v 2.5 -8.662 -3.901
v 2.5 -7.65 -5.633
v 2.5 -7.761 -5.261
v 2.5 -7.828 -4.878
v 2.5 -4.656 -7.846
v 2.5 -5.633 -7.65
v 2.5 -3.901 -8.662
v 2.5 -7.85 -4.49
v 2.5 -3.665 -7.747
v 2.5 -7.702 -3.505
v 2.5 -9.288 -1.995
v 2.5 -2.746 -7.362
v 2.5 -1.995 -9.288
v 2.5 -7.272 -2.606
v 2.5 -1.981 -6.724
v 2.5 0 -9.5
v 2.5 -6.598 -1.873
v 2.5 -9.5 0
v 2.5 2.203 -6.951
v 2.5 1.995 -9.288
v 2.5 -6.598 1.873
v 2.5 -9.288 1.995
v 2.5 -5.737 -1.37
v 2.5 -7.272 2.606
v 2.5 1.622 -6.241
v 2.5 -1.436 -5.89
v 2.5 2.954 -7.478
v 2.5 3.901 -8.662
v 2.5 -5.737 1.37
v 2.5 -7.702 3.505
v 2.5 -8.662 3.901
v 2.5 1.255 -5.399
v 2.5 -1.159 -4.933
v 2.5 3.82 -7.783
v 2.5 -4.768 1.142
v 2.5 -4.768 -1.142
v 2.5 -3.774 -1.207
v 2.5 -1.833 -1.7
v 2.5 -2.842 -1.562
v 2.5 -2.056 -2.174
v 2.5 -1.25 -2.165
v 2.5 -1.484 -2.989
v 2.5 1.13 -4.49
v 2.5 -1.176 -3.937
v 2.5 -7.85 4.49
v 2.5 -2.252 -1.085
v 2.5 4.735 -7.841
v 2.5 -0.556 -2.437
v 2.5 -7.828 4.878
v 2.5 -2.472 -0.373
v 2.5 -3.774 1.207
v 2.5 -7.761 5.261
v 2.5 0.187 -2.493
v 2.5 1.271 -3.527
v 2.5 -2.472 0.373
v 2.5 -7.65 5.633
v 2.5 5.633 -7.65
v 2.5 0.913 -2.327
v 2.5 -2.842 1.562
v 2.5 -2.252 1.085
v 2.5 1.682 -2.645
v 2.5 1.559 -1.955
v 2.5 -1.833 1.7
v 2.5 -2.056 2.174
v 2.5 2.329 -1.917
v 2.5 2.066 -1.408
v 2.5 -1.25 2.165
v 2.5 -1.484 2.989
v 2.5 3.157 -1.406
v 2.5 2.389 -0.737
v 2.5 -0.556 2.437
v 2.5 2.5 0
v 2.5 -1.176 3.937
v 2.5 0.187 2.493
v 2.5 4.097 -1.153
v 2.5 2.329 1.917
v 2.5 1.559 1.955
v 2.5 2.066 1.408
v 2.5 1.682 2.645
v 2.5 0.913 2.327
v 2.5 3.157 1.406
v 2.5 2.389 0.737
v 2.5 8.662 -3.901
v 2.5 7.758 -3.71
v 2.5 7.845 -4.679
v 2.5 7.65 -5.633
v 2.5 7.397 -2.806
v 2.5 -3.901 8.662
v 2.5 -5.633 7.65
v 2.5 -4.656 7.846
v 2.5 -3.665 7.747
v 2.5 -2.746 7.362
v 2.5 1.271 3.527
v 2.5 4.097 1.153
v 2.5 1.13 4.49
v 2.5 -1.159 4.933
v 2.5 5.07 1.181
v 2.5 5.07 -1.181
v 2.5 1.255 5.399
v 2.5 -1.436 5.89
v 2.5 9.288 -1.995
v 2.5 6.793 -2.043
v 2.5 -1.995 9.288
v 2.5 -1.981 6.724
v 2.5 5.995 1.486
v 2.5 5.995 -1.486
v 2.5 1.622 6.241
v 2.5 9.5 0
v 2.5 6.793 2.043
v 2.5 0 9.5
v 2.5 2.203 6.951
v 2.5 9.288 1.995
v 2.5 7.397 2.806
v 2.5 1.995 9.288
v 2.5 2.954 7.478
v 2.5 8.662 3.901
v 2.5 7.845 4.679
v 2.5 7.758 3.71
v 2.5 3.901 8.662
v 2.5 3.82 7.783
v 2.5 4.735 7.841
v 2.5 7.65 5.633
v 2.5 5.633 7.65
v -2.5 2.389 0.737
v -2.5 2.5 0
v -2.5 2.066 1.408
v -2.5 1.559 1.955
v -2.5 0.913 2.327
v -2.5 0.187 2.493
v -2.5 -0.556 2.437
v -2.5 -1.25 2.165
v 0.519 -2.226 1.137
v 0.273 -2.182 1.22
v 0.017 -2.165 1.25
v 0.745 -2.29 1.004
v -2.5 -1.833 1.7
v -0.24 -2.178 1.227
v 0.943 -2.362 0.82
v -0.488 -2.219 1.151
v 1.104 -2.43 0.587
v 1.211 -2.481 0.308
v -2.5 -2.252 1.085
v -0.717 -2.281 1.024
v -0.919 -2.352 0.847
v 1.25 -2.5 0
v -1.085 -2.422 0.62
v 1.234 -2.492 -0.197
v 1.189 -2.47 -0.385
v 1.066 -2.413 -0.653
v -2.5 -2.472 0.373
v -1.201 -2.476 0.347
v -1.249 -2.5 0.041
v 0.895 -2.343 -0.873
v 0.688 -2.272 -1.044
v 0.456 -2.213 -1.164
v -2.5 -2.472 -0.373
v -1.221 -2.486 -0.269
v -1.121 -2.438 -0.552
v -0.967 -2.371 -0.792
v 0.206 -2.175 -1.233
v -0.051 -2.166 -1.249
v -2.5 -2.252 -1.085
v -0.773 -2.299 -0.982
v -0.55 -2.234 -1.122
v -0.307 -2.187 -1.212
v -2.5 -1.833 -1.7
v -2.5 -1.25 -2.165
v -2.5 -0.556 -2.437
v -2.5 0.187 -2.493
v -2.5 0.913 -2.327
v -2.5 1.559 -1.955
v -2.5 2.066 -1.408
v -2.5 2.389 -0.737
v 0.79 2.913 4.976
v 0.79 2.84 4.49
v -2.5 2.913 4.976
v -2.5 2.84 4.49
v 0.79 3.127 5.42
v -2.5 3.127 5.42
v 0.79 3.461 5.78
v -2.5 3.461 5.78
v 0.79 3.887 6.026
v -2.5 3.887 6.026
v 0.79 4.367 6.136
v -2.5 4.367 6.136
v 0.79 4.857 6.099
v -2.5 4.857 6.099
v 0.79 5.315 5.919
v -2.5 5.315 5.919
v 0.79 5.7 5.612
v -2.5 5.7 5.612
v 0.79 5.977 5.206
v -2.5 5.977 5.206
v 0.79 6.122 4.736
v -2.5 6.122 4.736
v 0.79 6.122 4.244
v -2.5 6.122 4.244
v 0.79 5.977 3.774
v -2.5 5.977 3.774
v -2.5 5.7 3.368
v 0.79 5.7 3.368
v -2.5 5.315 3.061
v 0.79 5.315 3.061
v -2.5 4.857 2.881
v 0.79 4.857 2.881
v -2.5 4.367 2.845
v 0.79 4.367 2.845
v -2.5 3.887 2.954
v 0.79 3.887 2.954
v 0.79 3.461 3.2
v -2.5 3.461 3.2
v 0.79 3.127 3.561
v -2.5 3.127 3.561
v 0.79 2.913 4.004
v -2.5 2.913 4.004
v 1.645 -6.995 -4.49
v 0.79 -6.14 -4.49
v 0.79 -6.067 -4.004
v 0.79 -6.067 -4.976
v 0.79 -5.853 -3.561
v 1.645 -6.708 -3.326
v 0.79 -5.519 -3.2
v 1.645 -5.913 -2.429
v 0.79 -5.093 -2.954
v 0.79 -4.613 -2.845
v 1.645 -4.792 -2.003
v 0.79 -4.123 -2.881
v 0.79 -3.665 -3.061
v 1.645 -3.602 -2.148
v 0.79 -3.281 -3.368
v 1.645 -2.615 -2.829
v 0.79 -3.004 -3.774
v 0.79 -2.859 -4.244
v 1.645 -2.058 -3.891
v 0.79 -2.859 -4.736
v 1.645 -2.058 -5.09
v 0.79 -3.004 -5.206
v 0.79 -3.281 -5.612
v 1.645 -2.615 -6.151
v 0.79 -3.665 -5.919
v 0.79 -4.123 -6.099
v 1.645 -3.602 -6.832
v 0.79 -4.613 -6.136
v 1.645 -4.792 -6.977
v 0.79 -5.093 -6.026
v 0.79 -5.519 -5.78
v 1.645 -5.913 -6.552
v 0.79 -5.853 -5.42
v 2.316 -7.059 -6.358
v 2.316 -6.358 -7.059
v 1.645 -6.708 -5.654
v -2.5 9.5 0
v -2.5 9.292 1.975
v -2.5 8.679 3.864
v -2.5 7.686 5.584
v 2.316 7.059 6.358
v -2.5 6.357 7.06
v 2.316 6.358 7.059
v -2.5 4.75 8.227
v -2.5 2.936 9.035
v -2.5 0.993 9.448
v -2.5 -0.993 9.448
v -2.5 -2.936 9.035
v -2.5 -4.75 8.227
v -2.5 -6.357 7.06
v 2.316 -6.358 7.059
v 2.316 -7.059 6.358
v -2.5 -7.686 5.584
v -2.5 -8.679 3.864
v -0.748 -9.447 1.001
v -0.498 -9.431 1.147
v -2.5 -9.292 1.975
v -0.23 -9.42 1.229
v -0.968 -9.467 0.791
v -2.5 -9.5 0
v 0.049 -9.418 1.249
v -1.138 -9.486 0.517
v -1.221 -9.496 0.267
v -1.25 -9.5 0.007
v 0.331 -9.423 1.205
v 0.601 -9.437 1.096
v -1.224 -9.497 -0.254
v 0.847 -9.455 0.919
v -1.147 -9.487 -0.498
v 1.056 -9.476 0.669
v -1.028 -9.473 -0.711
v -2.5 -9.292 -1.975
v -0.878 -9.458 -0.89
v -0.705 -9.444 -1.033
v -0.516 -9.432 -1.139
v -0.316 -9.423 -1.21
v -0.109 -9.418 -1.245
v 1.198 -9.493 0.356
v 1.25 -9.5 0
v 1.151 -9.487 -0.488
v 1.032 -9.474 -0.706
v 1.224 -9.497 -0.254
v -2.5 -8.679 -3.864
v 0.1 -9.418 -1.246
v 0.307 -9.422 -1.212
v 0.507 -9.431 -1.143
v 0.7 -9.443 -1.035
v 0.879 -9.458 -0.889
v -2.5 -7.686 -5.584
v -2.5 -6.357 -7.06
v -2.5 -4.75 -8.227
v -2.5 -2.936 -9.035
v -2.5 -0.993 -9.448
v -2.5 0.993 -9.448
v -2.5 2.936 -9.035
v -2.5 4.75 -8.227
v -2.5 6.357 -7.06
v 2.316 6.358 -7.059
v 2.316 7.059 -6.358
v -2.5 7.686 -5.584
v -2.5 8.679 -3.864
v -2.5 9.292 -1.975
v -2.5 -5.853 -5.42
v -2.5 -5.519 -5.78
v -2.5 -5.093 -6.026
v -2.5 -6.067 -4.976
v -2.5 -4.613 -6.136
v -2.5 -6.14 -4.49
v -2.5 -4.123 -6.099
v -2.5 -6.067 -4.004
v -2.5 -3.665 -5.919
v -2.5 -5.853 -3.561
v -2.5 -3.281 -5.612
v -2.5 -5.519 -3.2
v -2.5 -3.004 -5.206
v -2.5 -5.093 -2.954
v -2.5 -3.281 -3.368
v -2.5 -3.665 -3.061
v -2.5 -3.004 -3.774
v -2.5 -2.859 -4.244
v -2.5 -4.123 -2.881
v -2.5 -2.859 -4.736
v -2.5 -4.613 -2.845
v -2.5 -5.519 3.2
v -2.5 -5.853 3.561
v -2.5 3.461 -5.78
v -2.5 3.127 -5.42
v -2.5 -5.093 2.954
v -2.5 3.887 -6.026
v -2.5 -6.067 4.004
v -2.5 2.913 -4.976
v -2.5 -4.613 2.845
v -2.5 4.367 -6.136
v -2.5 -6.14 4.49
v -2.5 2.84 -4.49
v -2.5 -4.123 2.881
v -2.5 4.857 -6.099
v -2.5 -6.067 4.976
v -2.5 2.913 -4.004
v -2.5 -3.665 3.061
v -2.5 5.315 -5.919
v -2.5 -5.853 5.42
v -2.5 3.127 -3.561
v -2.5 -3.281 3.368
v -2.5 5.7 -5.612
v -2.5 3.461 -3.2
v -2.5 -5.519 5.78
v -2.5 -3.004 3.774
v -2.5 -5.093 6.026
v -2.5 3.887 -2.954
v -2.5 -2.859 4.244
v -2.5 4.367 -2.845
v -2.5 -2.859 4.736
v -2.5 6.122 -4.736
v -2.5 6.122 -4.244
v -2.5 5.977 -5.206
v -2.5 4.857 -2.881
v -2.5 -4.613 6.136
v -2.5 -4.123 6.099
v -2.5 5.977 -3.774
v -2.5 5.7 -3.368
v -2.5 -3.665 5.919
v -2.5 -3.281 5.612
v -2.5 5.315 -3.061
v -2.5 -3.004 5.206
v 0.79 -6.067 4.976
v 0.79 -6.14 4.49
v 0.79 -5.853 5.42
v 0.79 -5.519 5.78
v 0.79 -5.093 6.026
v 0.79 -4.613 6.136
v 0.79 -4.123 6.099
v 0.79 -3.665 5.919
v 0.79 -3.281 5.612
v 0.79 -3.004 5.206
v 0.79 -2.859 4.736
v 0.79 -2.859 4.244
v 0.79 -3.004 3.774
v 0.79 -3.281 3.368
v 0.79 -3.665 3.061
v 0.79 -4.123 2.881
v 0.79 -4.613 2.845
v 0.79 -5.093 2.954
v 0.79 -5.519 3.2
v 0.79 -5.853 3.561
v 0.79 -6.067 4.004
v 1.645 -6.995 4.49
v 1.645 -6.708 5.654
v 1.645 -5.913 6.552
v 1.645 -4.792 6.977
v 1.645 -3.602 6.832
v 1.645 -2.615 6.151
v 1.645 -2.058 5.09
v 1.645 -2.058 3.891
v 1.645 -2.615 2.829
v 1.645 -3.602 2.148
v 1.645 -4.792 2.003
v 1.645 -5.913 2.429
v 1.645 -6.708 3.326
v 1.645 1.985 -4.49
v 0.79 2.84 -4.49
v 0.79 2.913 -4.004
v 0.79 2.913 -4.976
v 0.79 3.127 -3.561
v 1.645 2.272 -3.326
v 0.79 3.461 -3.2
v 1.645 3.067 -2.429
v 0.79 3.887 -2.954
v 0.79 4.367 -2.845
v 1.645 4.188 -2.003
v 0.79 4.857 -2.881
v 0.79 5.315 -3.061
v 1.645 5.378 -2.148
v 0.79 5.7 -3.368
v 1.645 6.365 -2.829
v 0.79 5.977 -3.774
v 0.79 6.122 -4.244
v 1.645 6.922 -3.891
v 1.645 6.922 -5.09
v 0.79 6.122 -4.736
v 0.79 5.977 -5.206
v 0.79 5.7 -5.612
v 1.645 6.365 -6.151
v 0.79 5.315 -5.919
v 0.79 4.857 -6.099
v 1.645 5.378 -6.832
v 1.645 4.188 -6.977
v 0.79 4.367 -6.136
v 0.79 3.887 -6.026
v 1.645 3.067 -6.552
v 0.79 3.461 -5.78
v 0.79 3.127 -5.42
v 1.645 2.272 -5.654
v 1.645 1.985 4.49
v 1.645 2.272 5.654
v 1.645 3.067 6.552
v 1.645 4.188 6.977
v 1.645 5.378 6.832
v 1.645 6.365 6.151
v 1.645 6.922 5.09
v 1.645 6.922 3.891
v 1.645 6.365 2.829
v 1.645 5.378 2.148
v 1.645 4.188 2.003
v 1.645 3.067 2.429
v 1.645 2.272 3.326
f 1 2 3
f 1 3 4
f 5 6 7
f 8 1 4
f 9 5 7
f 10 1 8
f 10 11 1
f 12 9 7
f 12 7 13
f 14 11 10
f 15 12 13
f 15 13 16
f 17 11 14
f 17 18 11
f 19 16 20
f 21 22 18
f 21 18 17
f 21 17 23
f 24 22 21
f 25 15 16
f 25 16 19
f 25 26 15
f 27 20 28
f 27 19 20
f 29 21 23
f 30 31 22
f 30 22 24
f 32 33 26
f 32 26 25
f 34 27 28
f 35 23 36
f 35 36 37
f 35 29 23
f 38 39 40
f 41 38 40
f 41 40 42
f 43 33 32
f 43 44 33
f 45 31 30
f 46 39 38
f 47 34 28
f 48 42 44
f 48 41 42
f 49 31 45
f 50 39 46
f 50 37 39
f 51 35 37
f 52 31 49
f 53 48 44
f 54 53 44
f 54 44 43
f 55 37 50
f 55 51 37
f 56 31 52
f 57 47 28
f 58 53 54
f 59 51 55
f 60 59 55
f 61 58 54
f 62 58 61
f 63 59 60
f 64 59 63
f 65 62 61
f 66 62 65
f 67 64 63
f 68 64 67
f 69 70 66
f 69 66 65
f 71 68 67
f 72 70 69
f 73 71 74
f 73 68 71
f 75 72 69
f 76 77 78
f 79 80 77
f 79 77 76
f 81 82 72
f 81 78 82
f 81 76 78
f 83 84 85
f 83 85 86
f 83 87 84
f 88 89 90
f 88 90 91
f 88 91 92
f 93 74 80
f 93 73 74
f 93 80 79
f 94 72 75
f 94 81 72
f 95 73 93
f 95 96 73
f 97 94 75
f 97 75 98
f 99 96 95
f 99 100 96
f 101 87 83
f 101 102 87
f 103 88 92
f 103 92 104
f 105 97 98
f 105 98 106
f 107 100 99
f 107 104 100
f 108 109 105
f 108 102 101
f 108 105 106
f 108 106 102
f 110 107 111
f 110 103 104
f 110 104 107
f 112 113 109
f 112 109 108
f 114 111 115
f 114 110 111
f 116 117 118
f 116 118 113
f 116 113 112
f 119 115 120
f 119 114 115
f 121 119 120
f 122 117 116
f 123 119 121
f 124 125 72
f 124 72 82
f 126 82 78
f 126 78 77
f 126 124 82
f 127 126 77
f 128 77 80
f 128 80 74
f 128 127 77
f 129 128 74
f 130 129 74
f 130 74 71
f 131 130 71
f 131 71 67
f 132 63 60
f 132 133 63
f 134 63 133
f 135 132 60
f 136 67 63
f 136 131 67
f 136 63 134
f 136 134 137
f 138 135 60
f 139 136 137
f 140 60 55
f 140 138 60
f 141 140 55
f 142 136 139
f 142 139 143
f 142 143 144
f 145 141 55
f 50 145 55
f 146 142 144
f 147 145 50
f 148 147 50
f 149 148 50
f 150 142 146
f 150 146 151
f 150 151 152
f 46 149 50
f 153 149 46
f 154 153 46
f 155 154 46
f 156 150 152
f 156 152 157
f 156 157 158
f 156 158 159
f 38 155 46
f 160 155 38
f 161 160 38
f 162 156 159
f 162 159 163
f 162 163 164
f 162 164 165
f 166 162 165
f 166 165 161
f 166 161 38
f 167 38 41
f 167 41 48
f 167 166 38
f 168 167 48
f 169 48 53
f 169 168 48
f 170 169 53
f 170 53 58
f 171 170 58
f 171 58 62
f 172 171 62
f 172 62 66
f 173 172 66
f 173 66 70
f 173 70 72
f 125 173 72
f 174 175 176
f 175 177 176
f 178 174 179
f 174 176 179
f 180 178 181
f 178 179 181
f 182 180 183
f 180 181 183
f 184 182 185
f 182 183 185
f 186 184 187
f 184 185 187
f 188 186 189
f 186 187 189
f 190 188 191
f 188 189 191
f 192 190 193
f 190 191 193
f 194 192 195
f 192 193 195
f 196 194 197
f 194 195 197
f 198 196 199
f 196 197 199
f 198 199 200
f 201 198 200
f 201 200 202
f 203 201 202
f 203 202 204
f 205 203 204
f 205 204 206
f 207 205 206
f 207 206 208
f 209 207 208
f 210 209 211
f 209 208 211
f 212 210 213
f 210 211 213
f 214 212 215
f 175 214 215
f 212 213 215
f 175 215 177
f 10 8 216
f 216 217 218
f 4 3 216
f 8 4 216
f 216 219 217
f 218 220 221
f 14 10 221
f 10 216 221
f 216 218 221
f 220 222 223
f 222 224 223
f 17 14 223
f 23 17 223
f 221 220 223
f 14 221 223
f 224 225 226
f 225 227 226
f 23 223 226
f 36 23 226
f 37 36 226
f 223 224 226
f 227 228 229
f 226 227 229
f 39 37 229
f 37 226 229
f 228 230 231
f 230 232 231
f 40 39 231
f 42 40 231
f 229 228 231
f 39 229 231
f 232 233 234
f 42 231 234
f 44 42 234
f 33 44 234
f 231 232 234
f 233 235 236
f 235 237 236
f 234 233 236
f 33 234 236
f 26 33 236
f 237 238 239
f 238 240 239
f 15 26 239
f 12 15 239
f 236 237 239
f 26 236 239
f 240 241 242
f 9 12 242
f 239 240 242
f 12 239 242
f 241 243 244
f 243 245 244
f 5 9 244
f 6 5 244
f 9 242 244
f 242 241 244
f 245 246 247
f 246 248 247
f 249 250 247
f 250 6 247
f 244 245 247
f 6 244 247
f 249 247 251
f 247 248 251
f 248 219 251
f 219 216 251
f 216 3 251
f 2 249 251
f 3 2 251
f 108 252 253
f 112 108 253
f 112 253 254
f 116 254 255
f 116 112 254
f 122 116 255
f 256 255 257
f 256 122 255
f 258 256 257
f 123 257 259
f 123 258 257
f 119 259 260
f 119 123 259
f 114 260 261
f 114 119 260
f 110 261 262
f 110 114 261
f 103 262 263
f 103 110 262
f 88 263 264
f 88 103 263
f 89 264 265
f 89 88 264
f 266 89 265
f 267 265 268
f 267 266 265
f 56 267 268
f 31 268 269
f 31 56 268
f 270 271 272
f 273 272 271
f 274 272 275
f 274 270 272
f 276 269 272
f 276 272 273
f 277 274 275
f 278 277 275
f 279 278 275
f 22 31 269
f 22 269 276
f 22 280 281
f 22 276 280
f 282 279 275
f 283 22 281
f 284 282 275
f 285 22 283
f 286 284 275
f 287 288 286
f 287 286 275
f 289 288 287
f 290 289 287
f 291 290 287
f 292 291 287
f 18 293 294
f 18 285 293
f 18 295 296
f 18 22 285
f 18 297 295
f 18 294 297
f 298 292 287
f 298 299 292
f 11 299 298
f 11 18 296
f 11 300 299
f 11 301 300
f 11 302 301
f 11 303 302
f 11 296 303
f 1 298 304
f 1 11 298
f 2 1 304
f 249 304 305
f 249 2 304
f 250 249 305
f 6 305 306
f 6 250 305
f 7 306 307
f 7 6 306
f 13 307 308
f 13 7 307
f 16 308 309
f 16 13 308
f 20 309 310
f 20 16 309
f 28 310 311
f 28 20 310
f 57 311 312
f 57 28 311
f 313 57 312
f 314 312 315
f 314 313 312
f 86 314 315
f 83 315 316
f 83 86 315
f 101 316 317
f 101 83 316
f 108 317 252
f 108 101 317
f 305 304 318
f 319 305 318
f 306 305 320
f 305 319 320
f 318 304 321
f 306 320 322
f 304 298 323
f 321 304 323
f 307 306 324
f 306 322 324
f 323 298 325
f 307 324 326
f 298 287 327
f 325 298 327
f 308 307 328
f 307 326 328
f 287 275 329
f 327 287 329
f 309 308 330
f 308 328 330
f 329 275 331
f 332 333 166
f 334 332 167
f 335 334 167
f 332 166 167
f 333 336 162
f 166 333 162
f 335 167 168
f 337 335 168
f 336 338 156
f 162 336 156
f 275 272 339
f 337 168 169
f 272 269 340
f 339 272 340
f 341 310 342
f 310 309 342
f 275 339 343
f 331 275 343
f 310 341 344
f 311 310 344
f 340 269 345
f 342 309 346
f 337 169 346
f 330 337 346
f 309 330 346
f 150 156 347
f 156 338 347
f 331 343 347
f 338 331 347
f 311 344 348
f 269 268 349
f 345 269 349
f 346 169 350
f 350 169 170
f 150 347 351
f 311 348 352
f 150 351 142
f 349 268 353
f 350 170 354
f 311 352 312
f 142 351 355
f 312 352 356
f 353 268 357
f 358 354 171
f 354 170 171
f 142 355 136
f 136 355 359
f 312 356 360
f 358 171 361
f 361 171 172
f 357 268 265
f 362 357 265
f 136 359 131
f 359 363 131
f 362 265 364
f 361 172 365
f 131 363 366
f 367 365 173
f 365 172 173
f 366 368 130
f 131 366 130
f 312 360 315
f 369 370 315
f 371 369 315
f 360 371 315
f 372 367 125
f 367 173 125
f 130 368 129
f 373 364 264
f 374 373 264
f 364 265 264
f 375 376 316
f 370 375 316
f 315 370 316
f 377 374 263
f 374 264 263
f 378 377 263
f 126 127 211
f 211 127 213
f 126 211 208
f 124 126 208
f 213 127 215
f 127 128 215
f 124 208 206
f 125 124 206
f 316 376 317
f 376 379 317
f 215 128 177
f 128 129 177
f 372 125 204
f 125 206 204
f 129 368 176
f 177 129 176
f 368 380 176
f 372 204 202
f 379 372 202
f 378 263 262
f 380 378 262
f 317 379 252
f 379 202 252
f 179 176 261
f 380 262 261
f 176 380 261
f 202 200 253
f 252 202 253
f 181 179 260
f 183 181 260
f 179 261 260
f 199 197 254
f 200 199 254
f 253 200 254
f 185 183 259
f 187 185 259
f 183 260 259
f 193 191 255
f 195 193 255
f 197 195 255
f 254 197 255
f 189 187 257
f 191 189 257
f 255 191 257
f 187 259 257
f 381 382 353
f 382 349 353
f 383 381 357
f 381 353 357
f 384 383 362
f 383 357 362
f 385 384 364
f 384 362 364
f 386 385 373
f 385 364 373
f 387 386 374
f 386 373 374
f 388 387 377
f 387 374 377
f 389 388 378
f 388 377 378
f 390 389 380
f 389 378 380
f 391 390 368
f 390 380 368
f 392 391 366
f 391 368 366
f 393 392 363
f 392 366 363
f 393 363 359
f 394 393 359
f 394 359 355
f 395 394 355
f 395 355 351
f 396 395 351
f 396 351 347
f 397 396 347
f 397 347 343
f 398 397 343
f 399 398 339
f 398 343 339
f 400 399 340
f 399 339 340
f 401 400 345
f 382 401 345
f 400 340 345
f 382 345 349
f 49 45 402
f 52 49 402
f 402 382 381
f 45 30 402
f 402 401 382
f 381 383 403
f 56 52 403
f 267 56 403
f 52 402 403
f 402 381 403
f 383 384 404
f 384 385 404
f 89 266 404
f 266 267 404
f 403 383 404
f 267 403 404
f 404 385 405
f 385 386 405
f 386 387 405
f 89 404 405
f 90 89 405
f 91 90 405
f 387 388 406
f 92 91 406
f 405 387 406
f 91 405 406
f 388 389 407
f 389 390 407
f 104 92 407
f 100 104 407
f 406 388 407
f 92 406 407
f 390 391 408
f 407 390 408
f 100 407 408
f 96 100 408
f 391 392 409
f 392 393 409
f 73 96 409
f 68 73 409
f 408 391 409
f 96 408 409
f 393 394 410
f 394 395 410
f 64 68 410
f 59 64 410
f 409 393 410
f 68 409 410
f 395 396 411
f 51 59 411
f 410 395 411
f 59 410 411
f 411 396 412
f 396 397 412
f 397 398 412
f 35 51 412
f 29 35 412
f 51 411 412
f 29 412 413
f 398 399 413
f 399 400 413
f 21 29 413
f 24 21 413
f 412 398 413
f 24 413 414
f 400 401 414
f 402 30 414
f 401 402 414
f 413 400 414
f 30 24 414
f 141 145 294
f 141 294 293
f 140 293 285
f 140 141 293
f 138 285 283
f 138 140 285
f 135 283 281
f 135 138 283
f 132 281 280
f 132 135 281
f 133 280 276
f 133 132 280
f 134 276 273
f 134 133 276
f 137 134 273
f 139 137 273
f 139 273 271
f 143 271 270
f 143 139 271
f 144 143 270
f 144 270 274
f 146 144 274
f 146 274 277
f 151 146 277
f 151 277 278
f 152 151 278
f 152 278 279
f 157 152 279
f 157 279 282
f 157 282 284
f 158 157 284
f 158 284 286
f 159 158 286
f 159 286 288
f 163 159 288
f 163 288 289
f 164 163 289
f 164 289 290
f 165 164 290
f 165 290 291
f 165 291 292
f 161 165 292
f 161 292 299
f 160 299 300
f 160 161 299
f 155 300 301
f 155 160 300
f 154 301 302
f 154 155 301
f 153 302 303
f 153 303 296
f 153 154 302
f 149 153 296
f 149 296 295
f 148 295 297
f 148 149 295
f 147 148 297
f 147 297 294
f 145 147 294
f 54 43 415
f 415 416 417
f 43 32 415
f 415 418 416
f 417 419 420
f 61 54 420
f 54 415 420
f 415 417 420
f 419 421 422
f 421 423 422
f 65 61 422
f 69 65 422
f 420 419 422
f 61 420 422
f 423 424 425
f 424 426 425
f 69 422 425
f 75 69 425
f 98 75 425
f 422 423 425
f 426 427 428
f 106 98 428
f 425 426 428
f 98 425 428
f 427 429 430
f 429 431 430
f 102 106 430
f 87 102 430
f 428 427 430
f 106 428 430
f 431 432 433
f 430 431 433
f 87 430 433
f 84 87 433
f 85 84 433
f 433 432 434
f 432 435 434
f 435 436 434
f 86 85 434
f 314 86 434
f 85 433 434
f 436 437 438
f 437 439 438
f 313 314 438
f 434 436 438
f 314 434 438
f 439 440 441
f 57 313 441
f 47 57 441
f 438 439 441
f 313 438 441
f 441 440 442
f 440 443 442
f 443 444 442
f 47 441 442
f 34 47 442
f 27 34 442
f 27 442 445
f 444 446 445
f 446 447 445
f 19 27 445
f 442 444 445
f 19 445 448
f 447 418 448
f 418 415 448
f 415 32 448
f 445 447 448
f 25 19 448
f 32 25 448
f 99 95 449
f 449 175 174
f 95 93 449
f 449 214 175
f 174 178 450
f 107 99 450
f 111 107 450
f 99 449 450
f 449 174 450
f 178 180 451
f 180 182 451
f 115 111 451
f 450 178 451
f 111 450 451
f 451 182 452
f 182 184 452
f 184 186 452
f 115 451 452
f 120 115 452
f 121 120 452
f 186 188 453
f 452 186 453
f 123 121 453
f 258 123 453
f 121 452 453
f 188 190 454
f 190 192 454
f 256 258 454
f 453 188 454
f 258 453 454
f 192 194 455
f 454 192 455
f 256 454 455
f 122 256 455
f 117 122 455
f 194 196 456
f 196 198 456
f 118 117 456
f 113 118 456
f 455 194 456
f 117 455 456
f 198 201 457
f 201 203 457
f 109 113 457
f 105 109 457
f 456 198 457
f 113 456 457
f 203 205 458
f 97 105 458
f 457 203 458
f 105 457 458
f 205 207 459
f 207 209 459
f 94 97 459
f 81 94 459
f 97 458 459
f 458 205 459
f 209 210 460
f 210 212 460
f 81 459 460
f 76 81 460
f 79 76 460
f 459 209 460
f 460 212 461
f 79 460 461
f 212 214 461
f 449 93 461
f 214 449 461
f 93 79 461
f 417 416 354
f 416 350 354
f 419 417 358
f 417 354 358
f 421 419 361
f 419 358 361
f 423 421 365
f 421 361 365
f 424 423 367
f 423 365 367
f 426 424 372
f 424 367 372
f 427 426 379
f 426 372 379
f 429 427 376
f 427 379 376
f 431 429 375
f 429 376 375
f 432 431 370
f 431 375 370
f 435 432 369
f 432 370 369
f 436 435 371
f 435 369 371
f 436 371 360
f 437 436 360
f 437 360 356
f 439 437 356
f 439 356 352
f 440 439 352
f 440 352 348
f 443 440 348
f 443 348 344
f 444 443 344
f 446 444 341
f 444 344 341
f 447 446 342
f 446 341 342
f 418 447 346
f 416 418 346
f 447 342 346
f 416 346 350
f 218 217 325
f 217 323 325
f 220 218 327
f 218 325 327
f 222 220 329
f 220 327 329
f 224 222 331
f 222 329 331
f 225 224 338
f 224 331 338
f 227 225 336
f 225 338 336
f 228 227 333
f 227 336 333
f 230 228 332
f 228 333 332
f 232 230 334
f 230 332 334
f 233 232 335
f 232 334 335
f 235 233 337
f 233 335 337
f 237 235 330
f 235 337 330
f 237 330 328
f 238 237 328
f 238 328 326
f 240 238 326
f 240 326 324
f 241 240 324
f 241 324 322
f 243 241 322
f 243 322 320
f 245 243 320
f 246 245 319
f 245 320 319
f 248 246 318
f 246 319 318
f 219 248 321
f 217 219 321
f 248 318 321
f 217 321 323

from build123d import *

# Parameters (mm, degrees)
F0_R           = 9.5
F0_R_2         = 2.5
F1_DEPTH       = 2.5
F3_R           = 1.25
F4_DEPTH       = 9.501
F5_D           = 3.3
F5_CSINK_D     = 6.72
F5_CSINK_ANGLE = 90


with BuildPart() as f1:
    # F0 (on Right) → F1 (new body, symmetric)
    with BuildSketch(Plane.YZ):
        Circle(F0_R)
        Circle(F0_R_2, mode=Mode.SUBTRACT)
    extrude(amount=F1_DEPTH, both=True)

    # F3 (on Front) → F4 (cut, through all)
    with BuildSketch(Plane.XZ):
        Circle(F3_R)
    extrude(amount=F4_DEPTH, mode=Mode.SUBTRACT)

    # F5 (through all)
    with Locations(Plane.YZ.offset(2.5)):
        with Locations((-4.4901280605, 4.4901280605), (4.4901280605, 4.4901280605), (4.4901280605, -4.4901280605), (-4.4901280605, -4.4901280605)):
            CounterSinkHole(F5_D / 2, F5_CSINK_D / 2, counter_sink_angle=F5_CSINK_ANGLE)


solid = f1.part
